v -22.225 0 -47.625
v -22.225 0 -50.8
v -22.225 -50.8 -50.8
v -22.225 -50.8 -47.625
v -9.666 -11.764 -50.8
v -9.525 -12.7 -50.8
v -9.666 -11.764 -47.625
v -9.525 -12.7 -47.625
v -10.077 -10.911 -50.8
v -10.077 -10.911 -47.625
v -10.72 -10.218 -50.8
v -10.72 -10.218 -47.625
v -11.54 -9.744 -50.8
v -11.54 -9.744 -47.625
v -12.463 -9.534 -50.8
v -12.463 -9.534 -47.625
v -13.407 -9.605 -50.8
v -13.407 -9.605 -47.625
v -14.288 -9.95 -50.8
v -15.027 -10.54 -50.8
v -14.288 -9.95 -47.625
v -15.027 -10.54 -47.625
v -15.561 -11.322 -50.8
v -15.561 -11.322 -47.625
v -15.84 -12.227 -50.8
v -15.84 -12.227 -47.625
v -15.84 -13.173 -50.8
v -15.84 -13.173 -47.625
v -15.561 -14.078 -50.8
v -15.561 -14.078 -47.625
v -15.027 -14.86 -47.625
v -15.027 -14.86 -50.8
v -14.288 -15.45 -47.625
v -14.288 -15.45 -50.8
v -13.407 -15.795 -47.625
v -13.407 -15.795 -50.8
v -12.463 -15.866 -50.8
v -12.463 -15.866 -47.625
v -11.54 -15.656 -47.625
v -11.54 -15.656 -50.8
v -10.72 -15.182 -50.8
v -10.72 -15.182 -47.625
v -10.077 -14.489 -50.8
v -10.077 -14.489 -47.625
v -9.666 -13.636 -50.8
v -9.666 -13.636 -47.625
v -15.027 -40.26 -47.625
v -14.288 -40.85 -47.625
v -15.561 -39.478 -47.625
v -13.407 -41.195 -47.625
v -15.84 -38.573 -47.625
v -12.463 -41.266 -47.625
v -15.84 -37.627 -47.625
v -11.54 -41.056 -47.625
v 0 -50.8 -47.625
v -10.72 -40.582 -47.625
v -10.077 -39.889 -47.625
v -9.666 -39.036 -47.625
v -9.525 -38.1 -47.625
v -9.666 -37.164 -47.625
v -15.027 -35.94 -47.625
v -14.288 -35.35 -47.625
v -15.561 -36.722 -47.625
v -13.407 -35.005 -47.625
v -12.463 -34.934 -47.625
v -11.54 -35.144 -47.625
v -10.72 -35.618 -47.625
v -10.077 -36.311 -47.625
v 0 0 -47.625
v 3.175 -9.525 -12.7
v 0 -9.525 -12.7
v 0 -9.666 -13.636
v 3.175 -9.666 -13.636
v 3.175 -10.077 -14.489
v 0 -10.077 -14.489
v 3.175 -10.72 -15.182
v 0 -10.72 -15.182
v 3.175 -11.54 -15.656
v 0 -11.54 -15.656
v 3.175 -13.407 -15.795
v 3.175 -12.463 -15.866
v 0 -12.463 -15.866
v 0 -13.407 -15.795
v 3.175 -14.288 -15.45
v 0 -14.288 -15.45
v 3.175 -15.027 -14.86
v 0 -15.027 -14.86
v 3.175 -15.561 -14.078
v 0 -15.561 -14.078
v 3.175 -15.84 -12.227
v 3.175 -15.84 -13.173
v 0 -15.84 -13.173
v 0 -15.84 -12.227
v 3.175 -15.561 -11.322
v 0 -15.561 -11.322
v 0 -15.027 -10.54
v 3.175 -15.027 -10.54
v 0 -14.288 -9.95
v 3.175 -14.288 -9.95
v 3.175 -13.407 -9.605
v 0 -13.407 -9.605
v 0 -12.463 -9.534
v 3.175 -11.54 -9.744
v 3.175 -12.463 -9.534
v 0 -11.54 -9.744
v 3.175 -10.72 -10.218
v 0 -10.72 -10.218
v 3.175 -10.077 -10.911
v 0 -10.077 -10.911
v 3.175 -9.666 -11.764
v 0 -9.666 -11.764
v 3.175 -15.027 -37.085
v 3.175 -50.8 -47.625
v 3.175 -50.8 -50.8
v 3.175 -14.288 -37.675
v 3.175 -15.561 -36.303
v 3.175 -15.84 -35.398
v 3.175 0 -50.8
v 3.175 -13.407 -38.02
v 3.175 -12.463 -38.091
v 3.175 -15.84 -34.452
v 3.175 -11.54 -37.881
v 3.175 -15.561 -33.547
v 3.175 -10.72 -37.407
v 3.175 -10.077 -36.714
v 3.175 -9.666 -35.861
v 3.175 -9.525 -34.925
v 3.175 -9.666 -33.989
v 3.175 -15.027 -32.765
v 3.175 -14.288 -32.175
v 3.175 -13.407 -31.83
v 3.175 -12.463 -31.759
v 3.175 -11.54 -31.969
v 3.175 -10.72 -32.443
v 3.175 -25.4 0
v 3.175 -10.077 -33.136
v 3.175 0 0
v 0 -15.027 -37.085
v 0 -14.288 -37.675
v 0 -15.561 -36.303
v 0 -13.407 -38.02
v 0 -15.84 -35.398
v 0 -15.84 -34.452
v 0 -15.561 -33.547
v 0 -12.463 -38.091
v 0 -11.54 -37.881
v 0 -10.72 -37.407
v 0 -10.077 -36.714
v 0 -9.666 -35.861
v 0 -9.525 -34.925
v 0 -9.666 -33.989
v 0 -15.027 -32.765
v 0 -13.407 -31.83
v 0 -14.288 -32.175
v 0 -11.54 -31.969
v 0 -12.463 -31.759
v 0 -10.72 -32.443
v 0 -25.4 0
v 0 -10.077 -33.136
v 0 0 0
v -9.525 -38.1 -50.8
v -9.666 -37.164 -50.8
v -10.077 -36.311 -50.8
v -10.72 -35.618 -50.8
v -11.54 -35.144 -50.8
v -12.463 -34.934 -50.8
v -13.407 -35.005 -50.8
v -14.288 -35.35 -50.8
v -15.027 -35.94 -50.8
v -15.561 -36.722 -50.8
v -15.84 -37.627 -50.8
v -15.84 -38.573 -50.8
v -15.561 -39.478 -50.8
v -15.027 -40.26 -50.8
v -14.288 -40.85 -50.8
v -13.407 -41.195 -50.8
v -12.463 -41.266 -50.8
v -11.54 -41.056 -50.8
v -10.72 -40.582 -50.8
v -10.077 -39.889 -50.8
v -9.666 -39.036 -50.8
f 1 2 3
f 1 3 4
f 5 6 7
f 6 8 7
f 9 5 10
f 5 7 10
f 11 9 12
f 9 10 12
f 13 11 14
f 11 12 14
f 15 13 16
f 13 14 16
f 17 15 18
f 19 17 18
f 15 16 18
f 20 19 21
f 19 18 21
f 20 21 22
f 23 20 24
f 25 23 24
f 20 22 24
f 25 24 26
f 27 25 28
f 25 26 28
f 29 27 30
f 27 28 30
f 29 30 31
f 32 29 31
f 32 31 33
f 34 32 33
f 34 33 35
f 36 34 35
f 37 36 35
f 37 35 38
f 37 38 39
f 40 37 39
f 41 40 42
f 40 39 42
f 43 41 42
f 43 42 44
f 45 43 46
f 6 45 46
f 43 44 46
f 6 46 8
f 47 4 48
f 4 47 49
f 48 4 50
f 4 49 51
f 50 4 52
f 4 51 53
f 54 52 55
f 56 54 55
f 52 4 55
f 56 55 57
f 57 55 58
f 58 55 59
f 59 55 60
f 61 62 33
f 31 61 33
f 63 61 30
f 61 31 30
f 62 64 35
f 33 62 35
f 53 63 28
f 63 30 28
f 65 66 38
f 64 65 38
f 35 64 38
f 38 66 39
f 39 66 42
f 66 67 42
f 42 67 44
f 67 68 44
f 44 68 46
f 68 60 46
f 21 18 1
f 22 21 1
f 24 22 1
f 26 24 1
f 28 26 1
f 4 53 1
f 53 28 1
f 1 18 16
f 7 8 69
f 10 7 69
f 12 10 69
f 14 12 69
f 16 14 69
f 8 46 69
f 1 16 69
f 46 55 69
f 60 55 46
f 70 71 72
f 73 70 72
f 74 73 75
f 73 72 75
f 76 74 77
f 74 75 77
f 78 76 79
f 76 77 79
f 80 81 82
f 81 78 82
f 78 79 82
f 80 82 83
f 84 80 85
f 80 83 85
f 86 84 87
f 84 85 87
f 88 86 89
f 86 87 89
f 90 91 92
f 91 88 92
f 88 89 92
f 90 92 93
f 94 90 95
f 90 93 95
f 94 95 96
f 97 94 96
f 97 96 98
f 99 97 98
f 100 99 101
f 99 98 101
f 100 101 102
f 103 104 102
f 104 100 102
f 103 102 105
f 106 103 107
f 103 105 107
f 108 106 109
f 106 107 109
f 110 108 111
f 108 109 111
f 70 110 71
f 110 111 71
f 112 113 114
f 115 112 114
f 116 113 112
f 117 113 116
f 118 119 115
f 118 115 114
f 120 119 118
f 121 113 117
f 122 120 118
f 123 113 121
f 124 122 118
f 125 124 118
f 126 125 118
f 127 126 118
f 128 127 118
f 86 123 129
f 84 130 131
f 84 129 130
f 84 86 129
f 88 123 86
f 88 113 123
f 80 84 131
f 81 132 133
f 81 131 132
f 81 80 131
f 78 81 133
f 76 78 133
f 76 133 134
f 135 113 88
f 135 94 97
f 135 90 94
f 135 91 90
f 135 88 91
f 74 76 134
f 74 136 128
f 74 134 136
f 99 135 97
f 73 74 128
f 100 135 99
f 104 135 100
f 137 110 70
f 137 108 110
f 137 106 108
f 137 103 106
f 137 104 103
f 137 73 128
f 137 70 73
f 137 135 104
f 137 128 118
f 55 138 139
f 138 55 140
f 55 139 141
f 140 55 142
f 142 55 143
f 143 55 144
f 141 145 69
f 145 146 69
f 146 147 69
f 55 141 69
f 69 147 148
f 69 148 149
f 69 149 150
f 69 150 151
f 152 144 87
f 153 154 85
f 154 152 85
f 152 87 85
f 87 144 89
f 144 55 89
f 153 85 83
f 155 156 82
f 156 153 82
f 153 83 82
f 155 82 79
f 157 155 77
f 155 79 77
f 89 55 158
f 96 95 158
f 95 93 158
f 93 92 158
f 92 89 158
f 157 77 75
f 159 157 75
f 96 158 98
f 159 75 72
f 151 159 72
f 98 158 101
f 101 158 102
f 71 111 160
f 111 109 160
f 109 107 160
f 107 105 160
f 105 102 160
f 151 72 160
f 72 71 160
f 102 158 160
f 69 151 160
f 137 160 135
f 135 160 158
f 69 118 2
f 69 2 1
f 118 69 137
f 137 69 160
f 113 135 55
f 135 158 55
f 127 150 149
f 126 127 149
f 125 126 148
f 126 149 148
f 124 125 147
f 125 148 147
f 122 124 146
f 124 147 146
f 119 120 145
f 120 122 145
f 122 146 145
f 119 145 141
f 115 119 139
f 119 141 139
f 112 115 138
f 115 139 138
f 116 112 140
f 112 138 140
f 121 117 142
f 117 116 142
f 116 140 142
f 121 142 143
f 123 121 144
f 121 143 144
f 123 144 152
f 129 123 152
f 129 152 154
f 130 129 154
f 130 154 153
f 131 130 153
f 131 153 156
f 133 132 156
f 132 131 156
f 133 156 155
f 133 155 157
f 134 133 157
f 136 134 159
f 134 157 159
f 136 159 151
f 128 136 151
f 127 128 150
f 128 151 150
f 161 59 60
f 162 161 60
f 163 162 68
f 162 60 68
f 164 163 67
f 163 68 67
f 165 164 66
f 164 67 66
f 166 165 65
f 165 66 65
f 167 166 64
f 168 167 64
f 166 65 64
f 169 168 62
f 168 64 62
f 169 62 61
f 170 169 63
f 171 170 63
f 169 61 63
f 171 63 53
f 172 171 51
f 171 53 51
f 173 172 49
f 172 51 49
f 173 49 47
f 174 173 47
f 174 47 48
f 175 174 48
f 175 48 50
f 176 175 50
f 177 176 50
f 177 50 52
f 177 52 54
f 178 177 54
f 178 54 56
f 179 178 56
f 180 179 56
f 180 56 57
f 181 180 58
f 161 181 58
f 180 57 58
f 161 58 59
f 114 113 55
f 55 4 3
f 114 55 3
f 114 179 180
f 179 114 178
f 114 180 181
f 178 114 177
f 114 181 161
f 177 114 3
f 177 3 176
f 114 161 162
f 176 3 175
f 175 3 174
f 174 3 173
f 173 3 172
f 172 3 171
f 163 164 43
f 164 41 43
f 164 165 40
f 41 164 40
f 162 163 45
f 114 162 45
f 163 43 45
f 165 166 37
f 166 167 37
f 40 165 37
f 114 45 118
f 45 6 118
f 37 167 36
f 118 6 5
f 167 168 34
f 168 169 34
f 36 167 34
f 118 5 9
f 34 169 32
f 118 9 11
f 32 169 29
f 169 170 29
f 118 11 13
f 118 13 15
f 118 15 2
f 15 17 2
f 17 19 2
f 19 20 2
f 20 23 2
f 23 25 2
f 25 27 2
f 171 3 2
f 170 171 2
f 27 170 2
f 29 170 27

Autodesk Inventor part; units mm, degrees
ref_plane "YZ Plane" through (0, 0, 0) normal (1, 0, 0) x (0, 1, 0)
ref_plane "XZ Plane" through (0, 0, 0) normal (0, 1, 0) x (-1, 0, 0)
ref_plane "XY Plane" through (0, 0, 0) normal (0, 0, 1) x (1, 0, 0)
sketch "Sketch1" plane through (0, 0, 0) normal (1, 0, 0) x (0, 1, 0)
  line L0 (-25.4, 0) -> (-50.8, -47.625)
  line L1 (-50.8, -47.625) -> (-50.8, -50.8)
  line L2 (-50.8, -50.8) -> (0, -50.8)
  line L3 (0, -50.8) -> (0, 0)
  line L4 (0, 0) -> (-25.4, 0)
  circle A0 centre (-12.7, -12.7) radius 3.175
  circle A1 centre (-12.7, -34.925) radius 3.175
  dimension "d1" = 3.175
  dimension "d2" = 50.8
  dimension "d3" = 50.8
  dimension "d4" = 25.4
  dimension "d5" = 6.35
  dimension "d6" = 6.35
  dimension "d7" = 15.875
  dimension "d8" = 12.7
  dimension "d9" = 12.7
  dimension "d10" = 12.7
extrude "Extrusion1" add sketch "Sketch1" along normal blind 3.175
sketch "Sketch2" plane through (0, 0, 0) normal (-1, 0, 0) x (0, 0, 1)
  line L0 (-50.8, -50.8) -> (-50.8, 0) projected
  line L1 (-50.8, 0) -> (0, 0) projected
  line L2 (-50.8, -50.8) -> (-47.625, -50.8)
  line L3 (-47.625, -50.8) -> (-47.625, 0)
  line L4 (-47.625, 0) -> (-50.8, 0)
  line L5 (-50.8, 0) -> (-50.8, -50.8)
  dimension "d13" = 3.175
extrude "Extrusion2" add sketch "Sketch2" along normal blind 22.225
sketch "Sketch3" plane through (0, -50.8, -47.625) normal (0, 0, 1) x (1, 0, 0)
  circle A0 centre (-12.7, 12.7) radius 3.175
  circle A1 centre (-12.7, 38.1) radius 3.175
  line L0 (-22.225, 50.8) -> (-22.225, 0) projected
  line L1 (0, 50.8) -> (-22.225, 50.8) projected
  line L2 (0, 0) -> (-22.225, 0) projected
  dimension "d16" = 9.525
  dimension "d17" = 12.7
  dimension "d18" = 9.525
  dimension "d19" = 12.7
  dimension "d20" = 6.35
extrude "Extrusion3" cut sketch "Sketch3" against normal blind 22.225
properties part number "15102898-16-P-0207" material "Aluminum 6061"
